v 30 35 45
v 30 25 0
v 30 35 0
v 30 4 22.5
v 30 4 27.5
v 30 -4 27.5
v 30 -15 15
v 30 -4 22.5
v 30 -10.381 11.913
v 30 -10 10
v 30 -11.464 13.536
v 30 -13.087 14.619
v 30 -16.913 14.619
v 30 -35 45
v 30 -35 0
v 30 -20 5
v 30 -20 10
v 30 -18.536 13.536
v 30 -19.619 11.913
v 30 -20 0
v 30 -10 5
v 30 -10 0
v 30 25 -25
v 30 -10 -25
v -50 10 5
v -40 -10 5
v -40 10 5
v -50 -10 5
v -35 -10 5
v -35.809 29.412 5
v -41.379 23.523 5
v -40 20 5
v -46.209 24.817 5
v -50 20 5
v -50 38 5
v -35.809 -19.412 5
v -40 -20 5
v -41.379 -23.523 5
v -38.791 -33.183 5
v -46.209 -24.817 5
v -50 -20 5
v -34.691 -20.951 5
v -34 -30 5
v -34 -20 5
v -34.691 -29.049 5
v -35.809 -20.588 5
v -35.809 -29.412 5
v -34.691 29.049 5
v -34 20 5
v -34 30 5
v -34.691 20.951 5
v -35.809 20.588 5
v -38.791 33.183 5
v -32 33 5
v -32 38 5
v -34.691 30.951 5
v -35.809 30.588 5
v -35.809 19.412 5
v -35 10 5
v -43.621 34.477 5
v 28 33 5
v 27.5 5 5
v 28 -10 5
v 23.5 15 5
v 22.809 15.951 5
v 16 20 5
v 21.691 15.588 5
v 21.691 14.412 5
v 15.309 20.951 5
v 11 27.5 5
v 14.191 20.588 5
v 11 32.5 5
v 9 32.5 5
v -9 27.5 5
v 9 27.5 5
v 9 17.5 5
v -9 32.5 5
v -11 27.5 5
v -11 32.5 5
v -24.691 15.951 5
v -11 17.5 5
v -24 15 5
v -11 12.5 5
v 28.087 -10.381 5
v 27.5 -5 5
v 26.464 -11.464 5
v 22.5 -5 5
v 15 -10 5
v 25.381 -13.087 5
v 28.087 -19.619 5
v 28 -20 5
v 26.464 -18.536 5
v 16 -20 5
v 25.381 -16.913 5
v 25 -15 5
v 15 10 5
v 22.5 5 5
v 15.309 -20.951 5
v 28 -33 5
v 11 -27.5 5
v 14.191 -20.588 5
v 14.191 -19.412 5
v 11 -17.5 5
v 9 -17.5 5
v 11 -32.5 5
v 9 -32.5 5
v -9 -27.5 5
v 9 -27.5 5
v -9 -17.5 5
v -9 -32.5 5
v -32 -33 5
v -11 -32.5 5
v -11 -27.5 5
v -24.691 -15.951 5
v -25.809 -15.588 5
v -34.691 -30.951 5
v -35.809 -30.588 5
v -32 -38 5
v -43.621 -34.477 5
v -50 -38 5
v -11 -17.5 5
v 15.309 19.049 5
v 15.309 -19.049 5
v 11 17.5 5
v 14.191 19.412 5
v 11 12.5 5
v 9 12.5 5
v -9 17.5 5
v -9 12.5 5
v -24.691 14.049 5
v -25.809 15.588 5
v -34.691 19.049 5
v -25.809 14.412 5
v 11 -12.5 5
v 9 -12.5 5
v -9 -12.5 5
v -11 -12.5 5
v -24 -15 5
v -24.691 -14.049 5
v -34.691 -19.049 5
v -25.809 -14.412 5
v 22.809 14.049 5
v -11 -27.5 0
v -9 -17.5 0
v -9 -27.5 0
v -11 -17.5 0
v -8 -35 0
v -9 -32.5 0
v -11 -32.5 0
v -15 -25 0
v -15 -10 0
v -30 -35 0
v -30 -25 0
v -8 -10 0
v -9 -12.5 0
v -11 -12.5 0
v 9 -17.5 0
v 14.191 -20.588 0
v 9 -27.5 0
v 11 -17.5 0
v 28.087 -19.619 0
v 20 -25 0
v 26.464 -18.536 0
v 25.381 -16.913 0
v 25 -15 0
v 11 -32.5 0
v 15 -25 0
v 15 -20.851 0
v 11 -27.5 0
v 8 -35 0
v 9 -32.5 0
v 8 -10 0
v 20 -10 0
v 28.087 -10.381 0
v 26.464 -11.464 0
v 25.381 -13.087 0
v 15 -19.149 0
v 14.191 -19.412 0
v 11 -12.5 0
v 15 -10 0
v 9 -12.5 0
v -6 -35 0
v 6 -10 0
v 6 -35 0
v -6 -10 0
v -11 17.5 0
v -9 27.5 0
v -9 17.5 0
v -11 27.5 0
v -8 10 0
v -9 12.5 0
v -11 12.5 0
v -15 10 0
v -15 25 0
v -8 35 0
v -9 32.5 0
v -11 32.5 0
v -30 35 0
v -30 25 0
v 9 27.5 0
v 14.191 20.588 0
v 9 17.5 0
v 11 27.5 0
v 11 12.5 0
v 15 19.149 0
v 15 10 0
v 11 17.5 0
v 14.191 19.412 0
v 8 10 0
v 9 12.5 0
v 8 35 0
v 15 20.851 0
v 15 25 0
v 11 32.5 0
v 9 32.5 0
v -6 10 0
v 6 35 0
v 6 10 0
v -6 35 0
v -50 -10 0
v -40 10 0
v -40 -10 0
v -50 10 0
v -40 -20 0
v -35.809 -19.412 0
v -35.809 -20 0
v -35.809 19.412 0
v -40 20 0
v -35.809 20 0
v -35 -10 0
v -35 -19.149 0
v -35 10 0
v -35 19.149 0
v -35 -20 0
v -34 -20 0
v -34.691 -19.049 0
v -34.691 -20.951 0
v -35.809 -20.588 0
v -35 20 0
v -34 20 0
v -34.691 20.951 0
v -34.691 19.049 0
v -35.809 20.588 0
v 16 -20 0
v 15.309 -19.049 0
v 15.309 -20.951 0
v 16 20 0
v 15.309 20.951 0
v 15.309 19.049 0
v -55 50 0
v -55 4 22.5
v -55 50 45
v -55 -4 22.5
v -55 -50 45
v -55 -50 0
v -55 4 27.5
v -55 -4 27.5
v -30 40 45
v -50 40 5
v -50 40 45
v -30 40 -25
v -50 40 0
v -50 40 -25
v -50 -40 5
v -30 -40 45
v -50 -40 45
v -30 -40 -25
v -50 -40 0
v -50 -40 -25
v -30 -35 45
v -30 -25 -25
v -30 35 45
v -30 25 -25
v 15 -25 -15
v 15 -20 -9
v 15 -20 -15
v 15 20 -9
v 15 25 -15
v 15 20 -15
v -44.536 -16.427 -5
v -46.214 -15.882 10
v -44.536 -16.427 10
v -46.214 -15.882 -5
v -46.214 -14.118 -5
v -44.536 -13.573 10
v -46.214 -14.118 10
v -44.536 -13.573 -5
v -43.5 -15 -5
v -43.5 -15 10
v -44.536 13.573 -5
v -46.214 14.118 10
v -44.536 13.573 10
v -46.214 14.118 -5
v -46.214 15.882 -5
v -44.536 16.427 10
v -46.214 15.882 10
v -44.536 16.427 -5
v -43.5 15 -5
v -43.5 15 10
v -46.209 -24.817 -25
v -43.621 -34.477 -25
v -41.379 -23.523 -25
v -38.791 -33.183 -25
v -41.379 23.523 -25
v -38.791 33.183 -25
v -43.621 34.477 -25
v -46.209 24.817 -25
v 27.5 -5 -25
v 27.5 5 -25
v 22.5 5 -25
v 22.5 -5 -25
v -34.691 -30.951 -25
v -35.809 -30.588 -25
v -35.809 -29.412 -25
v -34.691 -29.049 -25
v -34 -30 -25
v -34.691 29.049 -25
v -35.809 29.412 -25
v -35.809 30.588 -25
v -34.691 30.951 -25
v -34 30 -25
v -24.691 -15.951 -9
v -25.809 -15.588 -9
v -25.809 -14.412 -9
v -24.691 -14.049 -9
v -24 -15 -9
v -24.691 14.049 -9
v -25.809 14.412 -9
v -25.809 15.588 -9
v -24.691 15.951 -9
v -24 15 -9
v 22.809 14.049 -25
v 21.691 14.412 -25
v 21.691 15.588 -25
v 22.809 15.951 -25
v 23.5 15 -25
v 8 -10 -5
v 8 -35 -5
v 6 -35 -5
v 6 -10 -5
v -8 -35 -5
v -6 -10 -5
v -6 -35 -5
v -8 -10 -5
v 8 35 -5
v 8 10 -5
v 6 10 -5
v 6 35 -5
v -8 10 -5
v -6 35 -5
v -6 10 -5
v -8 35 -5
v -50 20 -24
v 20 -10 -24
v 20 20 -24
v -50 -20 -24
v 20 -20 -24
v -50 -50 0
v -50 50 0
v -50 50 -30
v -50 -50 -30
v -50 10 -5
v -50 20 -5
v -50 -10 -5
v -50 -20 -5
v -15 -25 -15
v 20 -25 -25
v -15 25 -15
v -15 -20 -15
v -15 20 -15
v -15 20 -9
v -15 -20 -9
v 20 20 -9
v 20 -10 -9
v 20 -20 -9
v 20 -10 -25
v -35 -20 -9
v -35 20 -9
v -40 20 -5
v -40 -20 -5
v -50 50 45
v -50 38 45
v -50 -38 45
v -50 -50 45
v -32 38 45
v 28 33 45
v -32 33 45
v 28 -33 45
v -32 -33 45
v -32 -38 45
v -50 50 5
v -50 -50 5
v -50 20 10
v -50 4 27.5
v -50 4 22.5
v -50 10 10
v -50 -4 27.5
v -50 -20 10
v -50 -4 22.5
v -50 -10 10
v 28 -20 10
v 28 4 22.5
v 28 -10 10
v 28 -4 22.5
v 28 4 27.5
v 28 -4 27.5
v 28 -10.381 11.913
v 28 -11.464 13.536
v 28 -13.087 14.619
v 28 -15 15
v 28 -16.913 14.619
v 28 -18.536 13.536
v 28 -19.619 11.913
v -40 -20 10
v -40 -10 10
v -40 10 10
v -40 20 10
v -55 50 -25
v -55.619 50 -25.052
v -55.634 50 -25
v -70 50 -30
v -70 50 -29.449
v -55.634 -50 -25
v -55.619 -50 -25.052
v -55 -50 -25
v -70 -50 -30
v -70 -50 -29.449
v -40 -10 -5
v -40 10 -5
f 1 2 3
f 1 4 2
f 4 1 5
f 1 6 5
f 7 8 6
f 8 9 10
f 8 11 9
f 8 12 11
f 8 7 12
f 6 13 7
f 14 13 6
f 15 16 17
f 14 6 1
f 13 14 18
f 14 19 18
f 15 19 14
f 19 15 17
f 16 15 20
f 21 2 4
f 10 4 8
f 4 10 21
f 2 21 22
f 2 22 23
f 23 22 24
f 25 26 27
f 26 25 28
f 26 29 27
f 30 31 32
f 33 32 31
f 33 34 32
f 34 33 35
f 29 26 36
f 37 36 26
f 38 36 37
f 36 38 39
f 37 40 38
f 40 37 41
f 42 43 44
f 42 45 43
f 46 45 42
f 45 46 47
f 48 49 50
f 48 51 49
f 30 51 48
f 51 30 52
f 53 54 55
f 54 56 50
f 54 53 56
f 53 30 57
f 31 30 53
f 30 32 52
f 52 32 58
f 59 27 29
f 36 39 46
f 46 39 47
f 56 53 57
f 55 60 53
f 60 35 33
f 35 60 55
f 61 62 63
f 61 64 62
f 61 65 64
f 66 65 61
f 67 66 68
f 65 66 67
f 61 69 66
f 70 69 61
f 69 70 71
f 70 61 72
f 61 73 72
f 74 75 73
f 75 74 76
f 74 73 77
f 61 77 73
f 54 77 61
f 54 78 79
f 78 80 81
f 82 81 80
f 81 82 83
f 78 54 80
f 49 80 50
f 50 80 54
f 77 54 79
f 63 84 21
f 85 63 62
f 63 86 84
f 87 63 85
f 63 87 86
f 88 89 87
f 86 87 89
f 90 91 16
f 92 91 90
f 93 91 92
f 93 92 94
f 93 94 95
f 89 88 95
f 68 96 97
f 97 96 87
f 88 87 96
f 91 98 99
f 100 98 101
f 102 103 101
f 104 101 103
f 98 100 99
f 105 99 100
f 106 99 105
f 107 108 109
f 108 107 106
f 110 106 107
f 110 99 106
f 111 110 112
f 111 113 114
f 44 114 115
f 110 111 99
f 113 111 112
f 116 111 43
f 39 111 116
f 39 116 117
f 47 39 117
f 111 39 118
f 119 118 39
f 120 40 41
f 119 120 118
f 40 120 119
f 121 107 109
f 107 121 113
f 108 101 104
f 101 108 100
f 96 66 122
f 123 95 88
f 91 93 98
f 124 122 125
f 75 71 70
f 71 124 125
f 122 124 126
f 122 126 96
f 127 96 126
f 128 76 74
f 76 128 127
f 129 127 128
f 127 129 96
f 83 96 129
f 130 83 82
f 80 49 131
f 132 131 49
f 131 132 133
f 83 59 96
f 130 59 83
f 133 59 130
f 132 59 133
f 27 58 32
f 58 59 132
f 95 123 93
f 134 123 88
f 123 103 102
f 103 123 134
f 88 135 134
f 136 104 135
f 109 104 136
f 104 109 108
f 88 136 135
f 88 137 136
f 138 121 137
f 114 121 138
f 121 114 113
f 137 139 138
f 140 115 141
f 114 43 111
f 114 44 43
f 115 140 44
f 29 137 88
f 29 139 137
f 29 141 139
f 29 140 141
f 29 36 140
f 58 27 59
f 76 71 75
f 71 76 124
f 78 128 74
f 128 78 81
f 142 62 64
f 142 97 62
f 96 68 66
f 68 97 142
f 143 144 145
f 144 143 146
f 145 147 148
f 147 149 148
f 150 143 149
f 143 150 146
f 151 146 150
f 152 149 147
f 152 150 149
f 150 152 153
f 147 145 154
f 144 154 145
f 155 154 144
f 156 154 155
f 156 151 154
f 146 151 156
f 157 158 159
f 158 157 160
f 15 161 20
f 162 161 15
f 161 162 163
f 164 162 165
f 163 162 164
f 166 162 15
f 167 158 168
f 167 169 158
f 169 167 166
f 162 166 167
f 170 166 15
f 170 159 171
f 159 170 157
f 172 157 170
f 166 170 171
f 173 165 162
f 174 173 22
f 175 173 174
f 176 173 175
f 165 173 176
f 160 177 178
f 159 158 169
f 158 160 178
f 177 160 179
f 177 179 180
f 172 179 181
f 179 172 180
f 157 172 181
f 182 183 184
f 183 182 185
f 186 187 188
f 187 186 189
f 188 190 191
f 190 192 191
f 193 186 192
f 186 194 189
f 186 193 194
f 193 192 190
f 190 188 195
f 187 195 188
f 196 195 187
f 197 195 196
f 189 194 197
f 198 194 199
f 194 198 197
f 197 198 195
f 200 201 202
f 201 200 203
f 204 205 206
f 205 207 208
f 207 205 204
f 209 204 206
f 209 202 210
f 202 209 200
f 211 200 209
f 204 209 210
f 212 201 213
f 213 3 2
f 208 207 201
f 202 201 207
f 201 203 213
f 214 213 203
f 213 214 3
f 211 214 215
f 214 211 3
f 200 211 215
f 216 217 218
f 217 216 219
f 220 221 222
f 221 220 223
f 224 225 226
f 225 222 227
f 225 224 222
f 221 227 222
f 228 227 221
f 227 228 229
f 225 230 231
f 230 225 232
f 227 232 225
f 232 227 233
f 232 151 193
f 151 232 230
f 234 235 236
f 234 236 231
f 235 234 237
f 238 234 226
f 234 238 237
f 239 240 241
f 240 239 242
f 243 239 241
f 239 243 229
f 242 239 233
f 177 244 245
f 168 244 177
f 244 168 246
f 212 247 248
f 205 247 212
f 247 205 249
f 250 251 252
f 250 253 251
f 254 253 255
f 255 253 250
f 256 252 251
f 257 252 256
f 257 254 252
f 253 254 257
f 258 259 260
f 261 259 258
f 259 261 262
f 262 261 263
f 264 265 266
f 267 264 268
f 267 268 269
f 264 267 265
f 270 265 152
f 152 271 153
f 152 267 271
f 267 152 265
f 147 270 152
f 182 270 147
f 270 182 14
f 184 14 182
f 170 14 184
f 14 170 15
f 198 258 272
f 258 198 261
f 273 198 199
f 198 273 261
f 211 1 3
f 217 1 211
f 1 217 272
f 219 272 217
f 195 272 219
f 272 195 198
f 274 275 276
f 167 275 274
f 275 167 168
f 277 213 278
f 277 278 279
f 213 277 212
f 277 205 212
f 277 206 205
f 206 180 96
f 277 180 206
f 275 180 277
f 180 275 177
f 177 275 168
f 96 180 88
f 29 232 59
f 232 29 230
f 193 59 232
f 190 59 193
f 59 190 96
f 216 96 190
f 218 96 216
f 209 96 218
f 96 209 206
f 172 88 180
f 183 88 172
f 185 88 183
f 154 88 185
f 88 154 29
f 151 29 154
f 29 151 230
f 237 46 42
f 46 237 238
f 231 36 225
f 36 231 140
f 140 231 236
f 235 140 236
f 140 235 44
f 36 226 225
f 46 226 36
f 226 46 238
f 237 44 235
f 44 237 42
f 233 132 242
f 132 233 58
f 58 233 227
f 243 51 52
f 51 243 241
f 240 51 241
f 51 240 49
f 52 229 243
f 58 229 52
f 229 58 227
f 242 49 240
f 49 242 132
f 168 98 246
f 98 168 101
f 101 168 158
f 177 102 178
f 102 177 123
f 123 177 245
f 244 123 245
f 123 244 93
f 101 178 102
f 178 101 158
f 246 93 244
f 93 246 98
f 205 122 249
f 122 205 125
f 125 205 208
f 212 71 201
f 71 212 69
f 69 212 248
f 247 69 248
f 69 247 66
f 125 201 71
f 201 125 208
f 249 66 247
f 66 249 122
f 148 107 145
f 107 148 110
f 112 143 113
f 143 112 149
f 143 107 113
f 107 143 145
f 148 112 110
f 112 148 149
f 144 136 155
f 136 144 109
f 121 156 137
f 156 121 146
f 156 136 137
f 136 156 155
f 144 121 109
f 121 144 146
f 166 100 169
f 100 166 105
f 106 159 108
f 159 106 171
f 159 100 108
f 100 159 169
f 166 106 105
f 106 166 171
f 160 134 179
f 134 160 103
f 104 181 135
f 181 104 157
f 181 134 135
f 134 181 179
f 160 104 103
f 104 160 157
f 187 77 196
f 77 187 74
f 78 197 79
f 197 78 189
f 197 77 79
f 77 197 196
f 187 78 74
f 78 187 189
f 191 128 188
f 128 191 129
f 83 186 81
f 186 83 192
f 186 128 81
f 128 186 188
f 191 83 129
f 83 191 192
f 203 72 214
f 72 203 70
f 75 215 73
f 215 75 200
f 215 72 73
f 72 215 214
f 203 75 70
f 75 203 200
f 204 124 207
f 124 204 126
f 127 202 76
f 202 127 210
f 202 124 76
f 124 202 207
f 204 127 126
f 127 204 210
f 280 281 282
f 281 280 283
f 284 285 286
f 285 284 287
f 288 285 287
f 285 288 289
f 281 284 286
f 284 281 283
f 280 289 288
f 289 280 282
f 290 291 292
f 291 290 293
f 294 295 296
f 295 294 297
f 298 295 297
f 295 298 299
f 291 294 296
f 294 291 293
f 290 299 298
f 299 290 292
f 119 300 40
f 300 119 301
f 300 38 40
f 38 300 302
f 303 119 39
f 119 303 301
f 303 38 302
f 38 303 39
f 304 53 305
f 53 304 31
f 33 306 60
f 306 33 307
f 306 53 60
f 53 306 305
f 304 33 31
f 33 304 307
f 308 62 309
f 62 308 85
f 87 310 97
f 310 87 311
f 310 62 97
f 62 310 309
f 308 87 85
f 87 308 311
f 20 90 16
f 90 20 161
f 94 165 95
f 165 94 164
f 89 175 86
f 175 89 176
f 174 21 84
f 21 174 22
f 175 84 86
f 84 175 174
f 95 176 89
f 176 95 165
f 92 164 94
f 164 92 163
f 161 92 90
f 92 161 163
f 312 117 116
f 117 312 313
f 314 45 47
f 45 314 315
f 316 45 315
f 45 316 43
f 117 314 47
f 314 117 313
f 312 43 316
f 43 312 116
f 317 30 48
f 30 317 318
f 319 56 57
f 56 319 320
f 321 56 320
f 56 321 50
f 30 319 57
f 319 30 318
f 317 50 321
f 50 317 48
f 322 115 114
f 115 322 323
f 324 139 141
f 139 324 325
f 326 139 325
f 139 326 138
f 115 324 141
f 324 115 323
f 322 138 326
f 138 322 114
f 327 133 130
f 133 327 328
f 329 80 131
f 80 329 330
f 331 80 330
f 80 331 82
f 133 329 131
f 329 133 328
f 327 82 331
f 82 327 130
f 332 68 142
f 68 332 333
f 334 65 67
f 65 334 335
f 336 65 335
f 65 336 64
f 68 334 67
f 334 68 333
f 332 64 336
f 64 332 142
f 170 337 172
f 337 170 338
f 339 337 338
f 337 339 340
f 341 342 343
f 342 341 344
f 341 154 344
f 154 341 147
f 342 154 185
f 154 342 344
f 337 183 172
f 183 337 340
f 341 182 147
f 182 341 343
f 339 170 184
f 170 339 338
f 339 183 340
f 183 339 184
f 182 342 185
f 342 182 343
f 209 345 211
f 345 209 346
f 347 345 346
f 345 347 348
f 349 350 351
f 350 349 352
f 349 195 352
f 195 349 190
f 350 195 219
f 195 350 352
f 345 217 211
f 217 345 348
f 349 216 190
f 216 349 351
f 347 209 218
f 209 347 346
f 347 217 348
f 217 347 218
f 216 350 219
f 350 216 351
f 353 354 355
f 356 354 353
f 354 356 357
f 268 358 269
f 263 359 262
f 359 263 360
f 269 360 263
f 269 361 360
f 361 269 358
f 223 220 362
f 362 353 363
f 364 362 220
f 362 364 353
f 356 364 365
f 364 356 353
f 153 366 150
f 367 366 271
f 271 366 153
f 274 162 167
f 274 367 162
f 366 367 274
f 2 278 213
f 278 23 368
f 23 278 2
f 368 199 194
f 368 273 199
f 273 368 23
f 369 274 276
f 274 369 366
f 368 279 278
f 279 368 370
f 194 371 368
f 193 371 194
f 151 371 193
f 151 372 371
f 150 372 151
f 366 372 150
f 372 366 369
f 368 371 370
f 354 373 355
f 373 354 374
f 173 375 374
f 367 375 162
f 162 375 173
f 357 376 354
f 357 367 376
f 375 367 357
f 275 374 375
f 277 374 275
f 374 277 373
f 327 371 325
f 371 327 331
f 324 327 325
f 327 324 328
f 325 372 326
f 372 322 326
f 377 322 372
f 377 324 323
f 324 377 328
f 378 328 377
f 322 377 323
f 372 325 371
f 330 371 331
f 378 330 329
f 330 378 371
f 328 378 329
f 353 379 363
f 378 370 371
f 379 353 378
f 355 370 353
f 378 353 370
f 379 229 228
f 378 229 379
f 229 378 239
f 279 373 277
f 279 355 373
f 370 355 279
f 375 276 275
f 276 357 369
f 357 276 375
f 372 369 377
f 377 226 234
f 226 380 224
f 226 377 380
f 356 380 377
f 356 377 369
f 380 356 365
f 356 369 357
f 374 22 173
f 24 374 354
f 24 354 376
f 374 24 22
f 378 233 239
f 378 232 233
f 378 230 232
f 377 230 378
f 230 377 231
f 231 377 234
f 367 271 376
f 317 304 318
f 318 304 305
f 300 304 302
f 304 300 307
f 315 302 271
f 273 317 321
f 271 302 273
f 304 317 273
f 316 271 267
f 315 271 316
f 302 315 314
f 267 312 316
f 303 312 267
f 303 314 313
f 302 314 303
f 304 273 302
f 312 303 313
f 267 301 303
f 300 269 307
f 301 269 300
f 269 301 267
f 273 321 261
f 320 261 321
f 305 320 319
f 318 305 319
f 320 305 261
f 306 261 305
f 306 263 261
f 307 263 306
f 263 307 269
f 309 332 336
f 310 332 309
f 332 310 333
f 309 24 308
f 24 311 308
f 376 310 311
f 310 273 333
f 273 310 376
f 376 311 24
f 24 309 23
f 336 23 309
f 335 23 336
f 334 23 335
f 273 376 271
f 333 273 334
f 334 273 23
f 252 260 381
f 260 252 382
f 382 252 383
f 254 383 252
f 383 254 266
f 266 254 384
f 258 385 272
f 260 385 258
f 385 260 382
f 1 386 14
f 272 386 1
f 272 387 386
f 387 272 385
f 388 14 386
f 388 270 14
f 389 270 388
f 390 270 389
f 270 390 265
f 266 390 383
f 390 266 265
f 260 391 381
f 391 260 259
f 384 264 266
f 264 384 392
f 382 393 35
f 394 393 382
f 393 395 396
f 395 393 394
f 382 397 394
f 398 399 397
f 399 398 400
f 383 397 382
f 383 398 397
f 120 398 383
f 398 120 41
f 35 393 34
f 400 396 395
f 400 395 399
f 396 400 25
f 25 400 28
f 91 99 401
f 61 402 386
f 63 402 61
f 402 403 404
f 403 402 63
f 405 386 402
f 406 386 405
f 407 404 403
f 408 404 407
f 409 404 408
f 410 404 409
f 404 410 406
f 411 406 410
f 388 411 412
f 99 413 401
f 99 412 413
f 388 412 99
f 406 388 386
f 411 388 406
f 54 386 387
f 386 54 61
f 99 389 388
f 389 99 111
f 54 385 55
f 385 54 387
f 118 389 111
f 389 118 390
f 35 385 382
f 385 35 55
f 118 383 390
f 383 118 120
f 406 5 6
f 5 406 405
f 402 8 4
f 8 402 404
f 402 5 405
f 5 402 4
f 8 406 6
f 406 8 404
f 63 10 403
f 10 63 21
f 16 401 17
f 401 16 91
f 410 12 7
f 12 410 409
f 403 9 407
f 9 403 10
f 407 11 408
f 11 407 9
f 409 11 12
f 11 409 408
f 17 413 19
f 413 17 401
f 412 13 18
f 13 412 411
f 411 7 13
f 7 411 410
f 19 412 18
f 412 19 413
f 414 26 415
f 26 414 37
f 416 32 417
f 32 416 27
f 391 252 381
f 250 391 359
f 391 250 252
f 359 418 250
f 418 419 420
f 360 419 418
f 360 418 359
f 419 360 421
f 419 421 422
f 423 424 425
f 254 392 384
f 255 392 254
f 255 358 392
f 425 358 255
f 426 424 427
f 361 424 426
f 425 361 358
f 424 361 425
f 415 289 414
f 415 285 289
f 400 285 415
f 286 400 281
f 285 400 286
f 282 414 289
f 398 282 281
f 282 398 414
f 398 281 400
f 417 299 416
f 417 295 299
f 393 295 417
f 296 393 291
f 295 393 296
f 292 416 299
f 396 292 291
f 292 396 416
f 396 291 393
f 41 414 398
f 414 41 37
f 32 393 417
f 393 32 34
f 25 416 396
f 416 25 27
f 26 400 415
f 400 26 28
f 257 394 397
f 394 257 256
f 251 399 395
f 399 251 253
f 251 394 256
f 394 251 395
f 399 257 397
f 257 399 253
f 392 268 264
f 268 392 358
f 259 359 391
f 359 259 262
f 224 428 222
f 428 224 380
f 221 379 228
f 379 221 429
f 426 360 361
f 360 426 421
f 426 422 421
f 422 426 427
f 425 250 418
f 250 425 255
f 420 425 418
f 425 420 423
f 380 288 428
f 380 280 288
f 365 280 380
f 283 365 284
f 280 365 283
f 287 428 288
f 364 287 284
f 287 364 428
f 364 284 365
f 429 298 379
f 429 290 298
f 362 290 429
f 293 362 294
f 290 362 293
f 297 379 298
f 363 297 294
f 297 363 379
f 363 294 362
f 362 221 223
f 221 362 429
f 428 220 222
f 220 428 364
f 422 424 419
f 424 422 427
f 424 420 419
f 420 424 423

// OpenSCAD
module Entretoise()
{
    cylinder(h = 5, r = 1);
}    

module Fix_Pelle()
{
    cylinder(h = 5, r = 1.5);
}

module Pass_Tirap()
{
    cube([2, 5, 5], true);
}    

module Support_MOT()
{
    difference()
    {
        cube([16, 25, 5], true);
        cube([12, 25, 5], true);
    }    
}    

module TCRT5K()
{
    cube([5, 10, 25], true);
}

module Vision_Capteur()
{
    cube([5, 8, 5], true);
}

// BASE
color("green")
{
    union()
    {
        difference()
        {
            // Base Chassis
            translate([-55, -40, 0]) cube([85, 80, 5]);
    
            // Passage Roues
            translate([0, -37.5, 2.5]) cube([60, 5, 5], true);
            translate([0,  37.5, 2.5]) cube([60, 5, 5], true);
    
            // ...
            translate([-35, -10, 0]) cube([50, 20, 5]);
    
            // Support PCB 
            translate([-35, -20, 0]) Entretoise();
            translate([-35,  20, 0]) Entretoise();
            translate([ 15, -20, 0]) Entretoise();
            translate([ 15,  20, 0]) Entretoise();
    
            // Attache MOT G
            translate([-10, -30, 2.5]) Pass_Tirap();
            translate([-10, -15, 2.5]) Pass_Tirap();
            translate([ 10, -30, 2.5]) Pass_Tirap();
            translate([ 10, -15, 2.5]) Pass_Tirap();
    
            // Attache MOT D
            translate([-10,  30, 2.5]) Pass_Tirap();
            translate([-10,  15, 2.5]) Pass_Tirap();
            translate([ 10,  30, 2.5]) Pass_Tirap();
            translate([ 10,  15, 2.5]) Pass_Tirap();
    
            // Attache Pelle
            translate([-45, -15, 0]) Fix_Pelle();
            translate([-45,  15, 0]) Fix_Pelle();
    
            // Passage Capteurs TCRT
            translate([-42.5, -29, 2.5]) rotate(a = [0, 0,  15]) TCRT5K();
            translate([-42.5,  29, 2.5]) rotate(a = [0, 0, -15]) TCRT5K();
            translate([ 25,   0, 2.5]) TCRT5K();
    
            // Passage Batterie
            translate([30, -15, 0]) cylinder(h = 5, r = 5);
        
            // Vis assemblage
            translate([-35, -30, 0]) cylinder(h = 5, r = 1);
            translate([-35,  30, 0]) cylinder(h = 5, r = 1);
            translate([-25, -15, 0]) cylinder(h = 5, r = 1);
            translate([-25,  15, 0]) cylinder(h = 5, r = 1);
            translate([ 22.5, 15, 0]) cylinder(h = 5, r = 1);
        }    

        translate([0, -22.5, -2.5]) Support_MOT();
        translate([0,  22.5, -2.5]) Support_MOT();
    }
}    

// BATTERIE
color("red")
{
    difference()
    {   
        // Base
        translate([-50, -40, -24]) cube([80,80,24]);
    
        // Passage Roues
        translate([0, -32.5, -12]) cube([60, 15, 24], true);
        translate([0,  32.5, -12]) cube([60, 15, 24], true);
    
        // Passage Moteurs
        translate([0, 0, -7.5]) cube([30,70,15], true);
    
        // Emplacement Batterie
        translate([-15, 0, -16.5]) cube([70,40,15], true);
    
        // Passage Cable Batterie
        translate([25, -17.5, -12]) cube([10,15,24], true);
    
        // Passage Capteurs TCRT
        translate([-42.5, -29, -12]) rotate(a = [0, 0,  15]) TCRT5K();
        translate([-42.5,  29, -12]) rotate(a = [0, 0, -15]) TCRT5K();
        translate([ 25,   0, -12]) TCRT5K();
    
        // Passage Pelle
        translate([-42.5, 0, -5]) cube([15,40,10], true);
    
        // Vis assemblage
        translate([-35, -30, -24]) cylinder(h = 24, r = 1);
        translate([-35,  30, -24]) cylinder(h = 24, r = 1);
        translate([-25, -15, -24]) cylinder(h = 24, r = 1);
        translate([-25,  15, -24]) cylinder(h = 24, r = 1);
        translate([ 22.5,  15, -24]) cylinder(h = 24, r = 1);
    }
}

// CAPOT BATTERIE
color("black")
{
    difference()
    {
        // Base
        translate([-50, -40, -25]) cube([80,80,1]);
    
        // Passage Roues
        translate([0, -32.5, -25]) cube([60, 15, 2], true);
        translate([0,  32.5, -25]) cube([60, 15, 2], true);
    
        // Passage Cable Batterie
        translate([25, -17.5, -25]) cube([10,15,2], true);
    
        // Passage Capteurs TCRT
        translate([-42.5, -29, -25]) rotate(a = [0, 0,  15]) TCRT5K();
        translate([-42.5,  29, -25]) rotate(a = [0, 0, -15]) TCRT5K();
        translate([ 25,   0, -25]) TCRT5K();
    
        // Vis assemblage
        translate([-35, -30, -26]) cylinder(h = 2, r = 1);
        translate([-35,  30, -26]) cylinder(h = 2, r = 1);
        translate([ 22.5,  15, -26]) cylinder(h = 2, r = 1);
    } 
}

// CAPOT ROBOT
color("black")
{
    difference()
    {
        // Base Chassis
        translate([-50, -40, 5]) cube([80, 80, 40]);
    
        // Passage Roues
        translate([0, -37.5, 25]) cube([60, 5, 40], true);
        translate([0,  37.5, 25]) cube([60, 5, 40], true);
    
        // Evidement interne
        translate([-7.5, 0, 25]) cube([71, 66, 40], true);
        translate([-42.5, 0, 25]) cube([21, 76, 40], true);
        
        // Vision Capteur
        translate([ 27.5, 0, 25]) Vision_Capteur();
        
        // Passage Batterie
        translate([27.5, -15, 5])cube([5, 10, 10], true);
        translate([27.5, -15, 10]) rotate(a = [0, 90,  0]) cylinder(h = 5, r = 5);
    }
}
// PELLE
color("blue")
{
    // Partie Haute
    union()
    {
        difference()
        {
            // Base
            translate([-55, -50, 5]) cube([15, 100, 40]);
            translate([ -50, -50, 10]) cube([10, 100, 35]);
    
            // Pattes de fixations
            translate([-45, -35, 7.5]) cube([10, 30, 5], true);
            translate([-45,  35, 7.5]) cube([10, 30, 5], true);
            translate([-45,   0, 7.5]) cube([10, 20, 5], true);
            translate([-45, -15, 5]) cylinder(h = 5, r = 1.5);
            translate([-45,  15, 5]) cylinder(h = 5, r = 1.5);
    
            // Vision Capteur
            translate([ -52.5, 0, 25]) Vision_Capteur();
        }
    
        // Support Capteur
    
        // Remplissage bord pelle
        translate([-52.5, -45, 2.5]) cube([5, 10, 5], true);
        translate([-52.5,  45, 2.5]) cube([5, 10, 5], true);
    }
    
    // Partie Basse
    difference()
    {
        // Base
        translate([-70, -50, -30]) cube([30, 100, 30]);
        translate([-70, -50, -25]) cube([15, 100, 25]);
        translate([ -50, -50, -30]) cube([10, 100, 25]);
    
        // Pattes de fixations
        translate([-45, -35, -2.5]) cube([10, 30, 5], true);
        translate([-45,  35, -2.5]) cube([10, 30, 5], true);
        translate([-45,   0, -2.5]) cube([10, 20, 5], true);
        translate([-45, -15, -5]) cylinder(h = 5, r = 1.5);
        translate([-45,  15, -5]) cylinder(h = 5, r = 1.5);
    
        // Forme
        translate([ -64, 0, -25]) rotate(a = [0,-17,0]) cube([16, 100, 5], true);
    }
    
}    
